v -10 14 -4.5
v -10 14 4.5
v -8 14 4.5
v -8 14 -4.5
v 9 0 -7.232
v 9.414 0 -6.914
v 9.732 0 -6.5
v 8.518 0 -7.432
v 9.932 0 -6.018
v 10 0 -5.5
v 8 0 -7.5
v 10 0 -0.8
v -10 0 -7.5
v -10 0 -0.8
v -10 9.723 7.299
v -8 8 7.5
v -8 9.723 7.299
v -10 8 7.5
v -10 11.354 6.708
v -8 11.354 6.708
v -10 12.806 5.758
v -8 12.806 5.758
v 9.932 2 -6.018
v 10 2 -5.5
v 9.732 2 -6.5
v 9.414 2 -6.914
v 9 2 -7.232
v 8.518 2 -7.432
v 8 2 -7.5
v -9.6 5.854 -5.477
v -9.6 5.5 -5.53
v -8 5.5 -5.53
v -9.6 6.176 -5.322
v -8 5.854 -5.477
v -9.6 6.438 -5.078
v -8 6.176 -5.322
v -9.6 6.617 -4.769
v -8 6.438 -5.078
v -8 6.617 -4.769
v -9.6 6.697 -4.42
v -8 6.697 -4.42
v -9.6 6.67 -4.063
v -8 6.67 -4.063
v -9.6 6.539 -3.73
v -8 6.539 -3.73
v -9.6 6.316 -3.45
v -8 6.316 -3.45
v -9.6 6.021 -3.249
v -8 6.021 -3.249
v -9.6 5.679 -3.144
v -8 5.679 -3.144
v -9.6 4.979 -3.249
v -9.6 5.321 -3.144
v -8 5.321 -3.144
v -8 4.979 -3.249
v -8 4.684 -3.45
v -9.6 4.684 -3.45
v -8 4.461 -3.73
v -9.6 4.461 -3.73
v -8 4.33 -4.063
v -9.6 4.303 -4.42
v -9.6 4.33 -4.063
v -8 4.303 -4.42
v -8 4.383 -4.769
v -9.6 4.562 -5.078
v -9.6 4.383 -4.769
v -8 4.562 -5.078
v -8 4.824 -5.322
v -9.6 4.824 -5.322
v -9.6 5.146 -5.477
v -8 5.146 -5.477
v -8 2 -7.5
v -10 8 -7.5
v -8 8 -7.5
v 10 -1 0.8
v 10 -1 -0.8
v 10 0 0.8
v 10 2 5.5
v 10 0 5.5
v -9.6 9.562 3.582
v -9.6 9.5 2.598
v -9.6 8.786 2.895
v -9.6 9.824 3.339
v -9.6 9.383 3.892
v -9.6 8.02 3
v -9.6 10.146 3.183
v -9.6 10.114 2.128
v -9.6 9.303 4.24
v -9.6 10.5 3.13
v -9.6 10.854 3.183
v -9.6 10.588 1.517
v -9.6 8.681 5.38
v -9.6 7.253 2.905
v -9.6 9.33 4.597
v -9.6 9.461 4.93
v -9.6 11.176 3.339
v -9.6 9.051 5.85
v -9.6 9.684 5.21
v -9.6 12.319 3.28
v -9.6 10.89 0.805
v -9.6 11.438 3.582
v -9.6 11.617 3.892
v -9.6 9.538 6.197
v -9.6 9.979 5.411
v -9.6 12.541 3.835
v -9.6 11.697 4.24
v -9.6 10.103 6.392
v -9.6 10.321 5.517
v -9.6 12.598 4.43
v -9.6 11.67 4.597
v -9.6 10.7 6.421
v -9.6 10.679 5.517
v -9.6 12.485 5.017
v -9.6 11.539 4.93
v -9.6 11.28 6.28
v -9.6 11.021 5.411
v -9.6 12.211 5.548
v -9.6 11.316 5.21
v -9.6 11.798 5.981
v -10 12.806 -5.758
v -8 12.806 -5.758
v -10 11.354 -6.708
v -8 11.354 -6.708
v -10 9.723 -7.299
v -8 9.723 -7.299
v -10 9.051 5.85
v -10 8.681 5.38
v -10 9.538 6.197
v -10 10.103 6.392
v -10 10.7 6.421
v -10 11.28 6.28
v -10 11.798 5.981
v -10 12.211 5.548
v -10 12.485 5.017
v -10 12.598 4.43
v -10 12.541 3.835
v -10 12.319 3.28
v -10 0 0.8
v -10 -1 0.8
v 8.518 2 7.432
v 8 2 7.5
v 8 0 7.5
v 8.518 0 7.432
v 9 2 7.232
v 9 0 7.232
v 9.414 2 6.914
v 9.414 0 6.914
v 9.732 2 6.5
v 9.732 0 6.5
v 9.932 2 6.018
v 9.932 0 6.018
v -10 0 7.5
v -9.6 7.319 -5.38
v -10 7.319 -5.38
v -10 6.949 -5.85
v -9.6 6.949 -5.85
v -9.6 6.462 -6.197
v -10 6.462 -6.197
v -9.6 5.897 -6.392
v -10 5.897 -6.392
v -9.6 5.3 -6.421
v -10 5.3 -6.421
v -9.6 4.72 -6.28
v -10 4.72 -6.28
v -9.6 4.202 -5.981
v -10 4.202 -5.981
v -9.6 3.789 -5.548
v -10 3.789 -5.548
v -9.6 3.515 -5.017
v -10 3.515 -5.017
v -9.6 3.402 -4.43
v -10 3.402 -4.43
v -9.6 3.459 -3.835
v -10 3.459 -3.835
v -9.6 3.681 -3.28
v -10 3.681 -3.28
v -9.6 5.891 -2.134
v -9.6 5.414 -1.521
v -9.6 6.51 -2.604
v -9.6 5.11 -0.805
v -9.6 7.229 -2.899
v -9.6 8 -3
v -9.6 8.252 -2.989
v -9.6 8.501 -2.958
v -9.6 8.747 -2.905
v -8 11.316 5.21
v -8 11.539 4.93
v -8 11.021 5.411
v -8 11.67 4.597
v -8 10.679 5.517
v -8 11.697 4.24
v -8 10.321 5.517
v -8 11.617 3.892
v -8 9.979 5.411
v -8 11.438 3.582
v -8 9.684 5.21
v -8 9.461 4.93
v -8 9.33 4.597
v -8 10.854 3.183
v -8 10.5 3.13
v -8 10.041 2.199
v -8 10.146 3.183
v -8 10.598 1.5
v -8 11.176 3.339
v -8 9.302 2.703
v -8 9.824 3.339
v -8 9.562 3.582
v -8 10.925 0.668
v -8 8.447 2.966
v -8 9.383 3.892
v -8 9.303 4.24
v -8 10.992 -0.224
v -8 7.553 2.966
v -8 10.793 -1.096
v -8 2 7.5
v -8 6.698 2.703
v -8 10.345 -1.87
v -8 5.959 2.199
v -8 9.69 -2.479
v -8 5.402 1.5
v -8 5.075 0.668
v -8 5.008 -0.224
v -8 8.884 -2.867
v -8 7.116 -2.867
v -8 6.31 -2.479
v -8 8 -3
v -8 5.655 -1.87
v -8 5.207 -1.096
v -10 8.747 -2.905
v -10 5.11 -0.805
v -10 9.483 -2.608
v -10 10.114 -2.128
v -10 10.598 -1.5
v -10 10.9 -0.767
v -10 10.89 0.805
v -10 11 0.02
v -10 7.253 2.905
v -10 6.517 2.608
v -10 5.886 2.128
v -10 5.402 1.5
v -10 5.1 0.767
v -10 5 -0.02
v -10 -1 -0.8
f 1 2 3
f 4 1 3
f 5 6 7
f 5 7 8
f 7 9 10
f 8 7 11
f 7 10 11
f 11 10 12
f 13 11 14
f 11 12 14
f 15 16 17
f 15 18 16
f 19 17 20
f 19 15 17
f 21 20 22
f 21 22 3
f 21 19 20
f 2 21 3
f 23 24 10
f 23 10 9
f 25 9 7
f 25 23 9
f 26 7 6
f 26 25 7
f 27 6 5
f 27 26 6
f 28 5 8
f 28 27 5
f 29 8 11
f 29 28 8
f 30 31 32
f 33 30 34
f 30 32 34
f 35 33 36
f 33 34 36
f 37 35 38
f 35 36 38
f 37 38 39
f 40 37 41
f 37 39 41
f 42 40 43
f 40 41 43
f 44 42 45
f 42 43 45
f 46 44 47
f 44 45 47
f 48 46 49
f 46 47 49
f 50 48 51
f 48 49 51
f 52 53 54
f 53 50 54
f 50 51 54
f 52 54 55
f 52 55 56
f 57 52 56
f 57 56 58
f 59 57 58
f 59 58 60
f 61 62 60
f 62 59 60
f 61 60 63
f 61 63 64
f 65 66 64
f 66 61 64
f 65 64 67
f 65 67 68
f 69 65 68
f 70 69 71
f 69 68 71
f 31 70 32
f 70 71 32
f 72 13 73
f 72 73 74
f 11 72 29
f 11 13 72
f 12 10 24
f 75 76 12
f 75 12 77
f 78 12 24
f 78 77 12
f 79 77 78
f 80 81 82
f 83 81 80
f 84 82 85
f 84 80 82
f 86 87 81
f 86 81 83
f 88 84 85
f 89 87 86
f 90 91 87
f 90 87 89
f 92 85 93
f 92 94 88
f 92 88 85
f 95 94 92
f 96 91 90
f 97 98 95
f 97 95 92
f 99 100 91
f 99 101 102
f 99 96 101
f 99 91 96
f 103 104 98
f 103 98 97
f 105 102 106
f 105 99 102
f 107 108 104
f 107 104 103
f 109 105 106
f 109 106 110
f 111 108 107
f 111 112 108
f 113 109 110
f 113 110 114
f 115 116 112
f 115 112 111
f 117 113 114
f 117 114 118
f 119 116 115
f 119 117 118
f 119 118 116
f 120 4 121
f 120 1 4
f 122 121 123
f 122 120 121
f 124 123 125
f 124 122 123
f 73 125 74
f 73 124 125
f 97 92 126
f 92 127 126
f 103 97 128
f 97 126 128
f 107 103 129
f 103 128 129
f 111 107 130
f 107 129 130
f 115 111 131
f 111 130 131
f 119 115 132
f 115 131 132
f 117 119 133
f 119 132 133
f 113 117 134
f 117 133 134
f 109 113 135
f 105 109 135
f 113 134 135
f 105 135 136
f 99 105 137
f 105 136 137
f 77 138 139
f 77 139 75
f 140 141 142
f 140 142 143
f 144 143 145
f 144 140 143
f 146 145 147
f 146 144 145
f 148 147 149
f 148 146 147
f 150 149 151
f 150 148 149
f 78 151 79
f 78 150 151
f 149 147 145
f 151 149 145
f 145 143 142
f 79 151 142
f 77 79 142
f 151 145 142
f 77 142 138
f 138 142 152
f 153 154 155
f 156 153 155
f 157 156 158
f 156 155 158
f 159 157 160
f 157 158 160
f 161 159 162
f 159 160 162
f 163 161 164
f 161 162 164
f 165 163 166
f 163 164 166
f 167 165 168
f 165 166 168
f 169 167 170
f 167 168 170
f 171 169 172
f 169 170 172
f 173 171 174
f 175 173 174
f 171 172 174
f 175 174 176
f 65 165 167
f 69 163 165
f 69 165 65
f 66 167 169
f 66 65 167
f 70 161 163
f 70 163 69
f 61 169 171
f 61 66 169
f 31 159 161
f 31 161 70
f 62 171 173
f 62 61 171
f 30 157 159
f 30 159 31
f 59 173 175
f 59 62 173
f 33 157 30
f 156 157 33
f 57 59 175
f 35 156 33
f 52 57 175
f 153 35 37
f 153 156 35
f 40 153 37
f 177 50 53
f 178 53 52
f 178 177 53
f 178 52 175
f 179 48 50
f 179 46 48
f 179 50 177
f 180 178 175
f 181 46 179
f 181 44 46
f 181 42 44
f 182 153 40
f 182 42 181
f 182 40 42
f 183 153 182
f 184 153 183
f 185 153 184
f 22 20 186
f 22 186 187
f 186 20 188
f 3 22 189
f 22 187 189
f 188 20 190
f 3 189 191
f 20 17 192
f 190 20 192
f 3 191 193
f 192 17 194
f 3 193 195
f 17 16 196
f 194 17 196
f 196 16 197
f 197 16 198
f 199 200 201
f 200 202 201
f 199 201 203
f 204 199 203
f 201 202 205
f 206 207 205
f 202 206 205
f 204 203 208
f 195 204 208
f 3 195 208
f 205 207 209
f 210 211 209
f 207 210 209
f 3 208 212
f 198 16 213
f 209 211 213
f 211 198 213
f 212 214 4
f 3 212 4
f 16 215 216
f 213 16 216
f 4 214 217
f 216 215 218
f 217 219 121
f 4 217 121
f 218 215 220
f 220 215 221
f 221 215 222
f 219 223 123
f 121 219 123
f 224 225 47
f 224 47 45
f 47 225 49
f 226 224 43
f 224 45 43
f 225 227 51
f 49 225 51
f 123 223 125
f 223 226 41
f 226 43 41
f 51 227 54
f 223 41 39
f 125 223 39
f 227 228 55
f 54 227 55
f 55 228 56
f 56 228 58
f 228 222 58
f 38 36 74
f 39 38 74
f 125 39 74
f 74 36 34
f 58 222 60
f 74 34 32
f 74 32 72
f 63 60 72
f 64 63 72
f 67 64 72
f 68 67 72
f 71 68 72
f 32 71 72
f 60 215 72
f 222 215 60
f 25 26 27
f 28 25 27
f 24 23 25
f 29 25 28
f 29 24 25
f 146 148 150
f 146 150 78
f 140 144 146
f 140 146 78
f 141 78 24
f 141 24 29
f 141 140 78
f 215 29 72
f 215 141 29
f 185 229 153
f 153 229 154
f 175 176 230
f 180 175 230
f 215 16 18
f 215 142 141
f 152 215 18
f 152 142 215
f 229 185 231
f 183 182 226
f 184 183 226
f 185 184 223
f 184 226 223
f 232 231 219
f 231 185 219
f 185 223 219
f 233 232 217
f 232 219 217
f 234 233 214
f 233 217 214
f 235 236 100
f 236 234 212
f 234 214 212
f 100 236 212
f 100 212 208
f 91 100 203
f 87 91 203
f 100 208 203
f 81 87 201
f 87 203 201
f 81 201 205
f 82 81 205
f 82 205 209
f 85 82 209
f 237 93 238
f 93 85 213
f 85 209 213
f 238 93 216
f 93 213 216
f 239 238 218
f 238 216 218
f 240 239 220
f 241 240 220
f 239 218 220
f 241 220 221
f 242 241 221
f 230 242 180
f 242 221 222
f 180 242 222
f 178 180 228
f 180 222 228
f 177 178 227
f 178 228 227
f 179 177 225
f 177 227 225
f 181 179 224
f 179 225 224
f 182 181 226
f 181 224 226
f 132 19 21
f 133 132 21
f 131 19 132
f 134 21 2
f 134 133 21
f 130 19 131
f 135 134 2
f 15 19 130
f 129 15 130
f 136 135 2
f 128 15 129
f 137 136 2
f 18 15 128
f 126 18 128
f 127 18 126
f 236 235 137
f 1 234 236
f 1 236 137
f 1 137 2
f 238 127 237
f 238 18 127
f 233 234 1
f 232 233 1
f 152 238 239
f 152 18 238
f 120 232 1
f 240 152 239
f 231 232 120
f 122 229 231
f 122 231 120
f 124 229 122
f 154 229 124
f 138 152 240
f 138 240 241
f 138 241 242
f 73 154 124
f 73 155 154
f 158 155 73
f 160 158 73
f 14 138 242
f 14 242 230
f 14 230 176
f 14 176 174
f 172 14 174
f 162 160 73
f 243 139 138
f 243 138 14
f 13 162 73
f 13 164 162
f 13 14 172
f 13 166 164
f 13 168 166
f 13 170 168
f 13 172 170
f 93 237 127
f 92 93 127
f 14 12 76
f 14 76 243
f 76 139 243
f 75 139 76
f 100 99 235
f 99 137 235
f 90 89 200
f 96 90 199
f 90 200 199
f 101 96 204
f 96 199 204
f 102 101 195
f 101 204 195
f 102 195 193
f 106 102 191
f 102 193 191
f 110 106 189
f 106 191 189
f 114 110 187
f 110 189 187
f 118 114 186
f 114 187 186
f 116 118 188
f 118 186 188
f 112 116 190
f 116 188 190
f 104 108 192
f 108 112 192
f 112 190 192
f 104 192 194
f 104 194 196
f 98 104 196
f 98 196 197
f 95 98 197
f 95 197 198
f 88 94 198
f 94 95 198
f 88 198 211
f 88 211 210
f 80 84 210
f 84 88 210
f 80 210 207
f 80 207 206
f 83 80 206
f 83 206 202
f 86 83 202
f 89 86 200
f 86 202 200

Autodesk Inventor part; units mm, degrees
ref_plane "YZ Plane" through (0, 0, 0) normal (1, 0, 0) x (0, 1, 0)
ref_plane "XZ Plane" through (0, 0, 0) normal (0, 1, 0) x (-1, 0, 0)
ref_plane "XY Plane" through (0, 0, 0) normal (0, 0, 1) x (1, 0, 0)
sketch "Sketch1" plane through (0, 0, 0) normal (0, 1, 0) x (-1, 0, 0)
  line L0 (-10, 7.5) -> (10, 7.5)
  line L1 (10, 7.5) -> (10, -7.5)
  line L2 (10, -7.5) -> (-10, -7.5)
  line L3 (-10, -7.5) -> (-10, 7.5)
  line L4 (-10, 7.5) -> (10, -7.5) construction
  line L5 (10, 7.5) -> (-10, -7.5) construction
  point P0 (0, 0)
  dimension "d0" = 20
  dimension "d1" = 15
extrude "Extrusion1" add sketch "Sketch1" along normal blind 2
sketch "Sketch2" plane through (0, 2, 0) normal (0, 1, 0) x (1, 0, 0)
  line L0 (-10, 7.5) -> (-10, -7.5) projected
  line L1 (-10, -7.5) -> (-8, -7.5)
  line L2 (-8, -7.5) -> (-8, 7.5)
  line L3 (-8, 7.5) -> (-10, 7.5)
  line L4 (-10, 7.5) -> (-10, -7.5)
  point P0 (0, 0)
  point P1 (-10, 0)
  point P2 (-10, 7.5)
  dimension "d4" = 2
  dimension "d5" = 15
extrude "Extrusion2" add sketch "Sketch2" along normal blind 12
sketch "Sketch3" plane through (-8, 2, 7.5) normal (1, 0, 0) x (0, 0, -1)
  circle A0 centre (7.5, 6) radius 3
  line L0 (0, 12) -> (15, 12) projected
  line L1 (15, 0) -> (15, 12) projected
  circle A1 centre (3.1699, 8.5) radius 1.2
  line L2 (0, -2) -> (0, 12) projected
  line L3 (0, 6) -> (15, 6) construction
  line L4 (0.8753, 9.8248) -> (14.1247, 2.1752) construction
  circle A2 centre (11.8301, 3.5) radius 1.2
  point P0 (7.5, -2)
  point P1 (7.5, 6)
  dimension "d8" = 6
  dimension "d9" = 6
  dimension "d10" = 7.5
  dimension "d11" = 2.4
  dimension "d12" = -30
  dimension "d13" = 5
  dimension "d14" = 2.4
  dimension "d15" = 5
extrude "Extrusion3" cut sketch "Sketch3" against normal blind 2
sketch "Sketch4" plane through (-10, 0, -7.5) normal (-1, 0, 0) x (0, 0, 1)
  circle A0 centre (7.5, 8) radius 3 projected
  circle A1 centre (7.5, 8) radius 7.5
  line L0 (0, 0) -> (0, 14) projected
  circle A2 centre (7.5, 8) radius 12.6892
  line L1 (7.5, 8) -> (-5.1892, 8)
  line L2 (7.5, 8) -> (20.1892, 8)
  point P0 (7.5, 0)
  point P1 (15, 8)
  point P2 (0, 8)
  dimension "d18" = 15
extrude "Extrusion4" cut sketch "Sketch4" against normal blind 2 contours A1 L1 A2 L2 picked at (-3.2639, 9.6105)
sketch "Sketch5" plane through (-10, 0, -7.5) normal (-1, 0, 0) x (0, 0, 1)
  circle A0 centre (3.1699, 5.5) radius 1.2 projected
  circle A1 centre (11.8301, 10.5) radius 1.2 projected
  line L0 (3.1699, 5.5) -> (11.8301, 10.5) construction
  line L1 (4.2199, 3.6813) -> (12.8801, 8.6813)
  line L2 (10.7801, 12.3187) -> (2.1199, 7.3187)
  arc A2 (2.1199, 7.3187) -> (4.2199, 3.6813) centre (3.1699, 5.5) ccw
  arc A3 (12.8801, 8.6813) -> (10.7801, 12.3187) centre (11.8301, 10.5) ccw
  point P0 (7.5, 0)
  point P1 (7.5, 8)
extrude "Extrusion6" cut sketch "Sketch5" against normal blind 0.4
sketch "Sketch7" plane through (0, 0, 0) normal (0, -1, 0) x (1, 0, 0)
  line L0 (-10, -7.5) -> (-10, 7.5) projected
  line L1 (-10, 0.8) -> (10, 0.8)
  line L2 (10, 0.8) -> (10, -0.8)
  line L3 (10, -0.8) -> (-10, -0.8)
  line L4 (-10, -0.8) -> (-10, 0.8)
  line L5 (10, 7.5) -> (10, -7.5) projected
  point P0 (0, 0)
  dimension "d27" = 1.6
  dimension "d28" = 0.8
extrude "Extrusion7" add sketch "Sketch7" along normal blind 1
fillet "Fillet1" radius 2 2 edges at (10, 1, -7.5) (10, 1, 7.5)
properties part number "Trzymak"
